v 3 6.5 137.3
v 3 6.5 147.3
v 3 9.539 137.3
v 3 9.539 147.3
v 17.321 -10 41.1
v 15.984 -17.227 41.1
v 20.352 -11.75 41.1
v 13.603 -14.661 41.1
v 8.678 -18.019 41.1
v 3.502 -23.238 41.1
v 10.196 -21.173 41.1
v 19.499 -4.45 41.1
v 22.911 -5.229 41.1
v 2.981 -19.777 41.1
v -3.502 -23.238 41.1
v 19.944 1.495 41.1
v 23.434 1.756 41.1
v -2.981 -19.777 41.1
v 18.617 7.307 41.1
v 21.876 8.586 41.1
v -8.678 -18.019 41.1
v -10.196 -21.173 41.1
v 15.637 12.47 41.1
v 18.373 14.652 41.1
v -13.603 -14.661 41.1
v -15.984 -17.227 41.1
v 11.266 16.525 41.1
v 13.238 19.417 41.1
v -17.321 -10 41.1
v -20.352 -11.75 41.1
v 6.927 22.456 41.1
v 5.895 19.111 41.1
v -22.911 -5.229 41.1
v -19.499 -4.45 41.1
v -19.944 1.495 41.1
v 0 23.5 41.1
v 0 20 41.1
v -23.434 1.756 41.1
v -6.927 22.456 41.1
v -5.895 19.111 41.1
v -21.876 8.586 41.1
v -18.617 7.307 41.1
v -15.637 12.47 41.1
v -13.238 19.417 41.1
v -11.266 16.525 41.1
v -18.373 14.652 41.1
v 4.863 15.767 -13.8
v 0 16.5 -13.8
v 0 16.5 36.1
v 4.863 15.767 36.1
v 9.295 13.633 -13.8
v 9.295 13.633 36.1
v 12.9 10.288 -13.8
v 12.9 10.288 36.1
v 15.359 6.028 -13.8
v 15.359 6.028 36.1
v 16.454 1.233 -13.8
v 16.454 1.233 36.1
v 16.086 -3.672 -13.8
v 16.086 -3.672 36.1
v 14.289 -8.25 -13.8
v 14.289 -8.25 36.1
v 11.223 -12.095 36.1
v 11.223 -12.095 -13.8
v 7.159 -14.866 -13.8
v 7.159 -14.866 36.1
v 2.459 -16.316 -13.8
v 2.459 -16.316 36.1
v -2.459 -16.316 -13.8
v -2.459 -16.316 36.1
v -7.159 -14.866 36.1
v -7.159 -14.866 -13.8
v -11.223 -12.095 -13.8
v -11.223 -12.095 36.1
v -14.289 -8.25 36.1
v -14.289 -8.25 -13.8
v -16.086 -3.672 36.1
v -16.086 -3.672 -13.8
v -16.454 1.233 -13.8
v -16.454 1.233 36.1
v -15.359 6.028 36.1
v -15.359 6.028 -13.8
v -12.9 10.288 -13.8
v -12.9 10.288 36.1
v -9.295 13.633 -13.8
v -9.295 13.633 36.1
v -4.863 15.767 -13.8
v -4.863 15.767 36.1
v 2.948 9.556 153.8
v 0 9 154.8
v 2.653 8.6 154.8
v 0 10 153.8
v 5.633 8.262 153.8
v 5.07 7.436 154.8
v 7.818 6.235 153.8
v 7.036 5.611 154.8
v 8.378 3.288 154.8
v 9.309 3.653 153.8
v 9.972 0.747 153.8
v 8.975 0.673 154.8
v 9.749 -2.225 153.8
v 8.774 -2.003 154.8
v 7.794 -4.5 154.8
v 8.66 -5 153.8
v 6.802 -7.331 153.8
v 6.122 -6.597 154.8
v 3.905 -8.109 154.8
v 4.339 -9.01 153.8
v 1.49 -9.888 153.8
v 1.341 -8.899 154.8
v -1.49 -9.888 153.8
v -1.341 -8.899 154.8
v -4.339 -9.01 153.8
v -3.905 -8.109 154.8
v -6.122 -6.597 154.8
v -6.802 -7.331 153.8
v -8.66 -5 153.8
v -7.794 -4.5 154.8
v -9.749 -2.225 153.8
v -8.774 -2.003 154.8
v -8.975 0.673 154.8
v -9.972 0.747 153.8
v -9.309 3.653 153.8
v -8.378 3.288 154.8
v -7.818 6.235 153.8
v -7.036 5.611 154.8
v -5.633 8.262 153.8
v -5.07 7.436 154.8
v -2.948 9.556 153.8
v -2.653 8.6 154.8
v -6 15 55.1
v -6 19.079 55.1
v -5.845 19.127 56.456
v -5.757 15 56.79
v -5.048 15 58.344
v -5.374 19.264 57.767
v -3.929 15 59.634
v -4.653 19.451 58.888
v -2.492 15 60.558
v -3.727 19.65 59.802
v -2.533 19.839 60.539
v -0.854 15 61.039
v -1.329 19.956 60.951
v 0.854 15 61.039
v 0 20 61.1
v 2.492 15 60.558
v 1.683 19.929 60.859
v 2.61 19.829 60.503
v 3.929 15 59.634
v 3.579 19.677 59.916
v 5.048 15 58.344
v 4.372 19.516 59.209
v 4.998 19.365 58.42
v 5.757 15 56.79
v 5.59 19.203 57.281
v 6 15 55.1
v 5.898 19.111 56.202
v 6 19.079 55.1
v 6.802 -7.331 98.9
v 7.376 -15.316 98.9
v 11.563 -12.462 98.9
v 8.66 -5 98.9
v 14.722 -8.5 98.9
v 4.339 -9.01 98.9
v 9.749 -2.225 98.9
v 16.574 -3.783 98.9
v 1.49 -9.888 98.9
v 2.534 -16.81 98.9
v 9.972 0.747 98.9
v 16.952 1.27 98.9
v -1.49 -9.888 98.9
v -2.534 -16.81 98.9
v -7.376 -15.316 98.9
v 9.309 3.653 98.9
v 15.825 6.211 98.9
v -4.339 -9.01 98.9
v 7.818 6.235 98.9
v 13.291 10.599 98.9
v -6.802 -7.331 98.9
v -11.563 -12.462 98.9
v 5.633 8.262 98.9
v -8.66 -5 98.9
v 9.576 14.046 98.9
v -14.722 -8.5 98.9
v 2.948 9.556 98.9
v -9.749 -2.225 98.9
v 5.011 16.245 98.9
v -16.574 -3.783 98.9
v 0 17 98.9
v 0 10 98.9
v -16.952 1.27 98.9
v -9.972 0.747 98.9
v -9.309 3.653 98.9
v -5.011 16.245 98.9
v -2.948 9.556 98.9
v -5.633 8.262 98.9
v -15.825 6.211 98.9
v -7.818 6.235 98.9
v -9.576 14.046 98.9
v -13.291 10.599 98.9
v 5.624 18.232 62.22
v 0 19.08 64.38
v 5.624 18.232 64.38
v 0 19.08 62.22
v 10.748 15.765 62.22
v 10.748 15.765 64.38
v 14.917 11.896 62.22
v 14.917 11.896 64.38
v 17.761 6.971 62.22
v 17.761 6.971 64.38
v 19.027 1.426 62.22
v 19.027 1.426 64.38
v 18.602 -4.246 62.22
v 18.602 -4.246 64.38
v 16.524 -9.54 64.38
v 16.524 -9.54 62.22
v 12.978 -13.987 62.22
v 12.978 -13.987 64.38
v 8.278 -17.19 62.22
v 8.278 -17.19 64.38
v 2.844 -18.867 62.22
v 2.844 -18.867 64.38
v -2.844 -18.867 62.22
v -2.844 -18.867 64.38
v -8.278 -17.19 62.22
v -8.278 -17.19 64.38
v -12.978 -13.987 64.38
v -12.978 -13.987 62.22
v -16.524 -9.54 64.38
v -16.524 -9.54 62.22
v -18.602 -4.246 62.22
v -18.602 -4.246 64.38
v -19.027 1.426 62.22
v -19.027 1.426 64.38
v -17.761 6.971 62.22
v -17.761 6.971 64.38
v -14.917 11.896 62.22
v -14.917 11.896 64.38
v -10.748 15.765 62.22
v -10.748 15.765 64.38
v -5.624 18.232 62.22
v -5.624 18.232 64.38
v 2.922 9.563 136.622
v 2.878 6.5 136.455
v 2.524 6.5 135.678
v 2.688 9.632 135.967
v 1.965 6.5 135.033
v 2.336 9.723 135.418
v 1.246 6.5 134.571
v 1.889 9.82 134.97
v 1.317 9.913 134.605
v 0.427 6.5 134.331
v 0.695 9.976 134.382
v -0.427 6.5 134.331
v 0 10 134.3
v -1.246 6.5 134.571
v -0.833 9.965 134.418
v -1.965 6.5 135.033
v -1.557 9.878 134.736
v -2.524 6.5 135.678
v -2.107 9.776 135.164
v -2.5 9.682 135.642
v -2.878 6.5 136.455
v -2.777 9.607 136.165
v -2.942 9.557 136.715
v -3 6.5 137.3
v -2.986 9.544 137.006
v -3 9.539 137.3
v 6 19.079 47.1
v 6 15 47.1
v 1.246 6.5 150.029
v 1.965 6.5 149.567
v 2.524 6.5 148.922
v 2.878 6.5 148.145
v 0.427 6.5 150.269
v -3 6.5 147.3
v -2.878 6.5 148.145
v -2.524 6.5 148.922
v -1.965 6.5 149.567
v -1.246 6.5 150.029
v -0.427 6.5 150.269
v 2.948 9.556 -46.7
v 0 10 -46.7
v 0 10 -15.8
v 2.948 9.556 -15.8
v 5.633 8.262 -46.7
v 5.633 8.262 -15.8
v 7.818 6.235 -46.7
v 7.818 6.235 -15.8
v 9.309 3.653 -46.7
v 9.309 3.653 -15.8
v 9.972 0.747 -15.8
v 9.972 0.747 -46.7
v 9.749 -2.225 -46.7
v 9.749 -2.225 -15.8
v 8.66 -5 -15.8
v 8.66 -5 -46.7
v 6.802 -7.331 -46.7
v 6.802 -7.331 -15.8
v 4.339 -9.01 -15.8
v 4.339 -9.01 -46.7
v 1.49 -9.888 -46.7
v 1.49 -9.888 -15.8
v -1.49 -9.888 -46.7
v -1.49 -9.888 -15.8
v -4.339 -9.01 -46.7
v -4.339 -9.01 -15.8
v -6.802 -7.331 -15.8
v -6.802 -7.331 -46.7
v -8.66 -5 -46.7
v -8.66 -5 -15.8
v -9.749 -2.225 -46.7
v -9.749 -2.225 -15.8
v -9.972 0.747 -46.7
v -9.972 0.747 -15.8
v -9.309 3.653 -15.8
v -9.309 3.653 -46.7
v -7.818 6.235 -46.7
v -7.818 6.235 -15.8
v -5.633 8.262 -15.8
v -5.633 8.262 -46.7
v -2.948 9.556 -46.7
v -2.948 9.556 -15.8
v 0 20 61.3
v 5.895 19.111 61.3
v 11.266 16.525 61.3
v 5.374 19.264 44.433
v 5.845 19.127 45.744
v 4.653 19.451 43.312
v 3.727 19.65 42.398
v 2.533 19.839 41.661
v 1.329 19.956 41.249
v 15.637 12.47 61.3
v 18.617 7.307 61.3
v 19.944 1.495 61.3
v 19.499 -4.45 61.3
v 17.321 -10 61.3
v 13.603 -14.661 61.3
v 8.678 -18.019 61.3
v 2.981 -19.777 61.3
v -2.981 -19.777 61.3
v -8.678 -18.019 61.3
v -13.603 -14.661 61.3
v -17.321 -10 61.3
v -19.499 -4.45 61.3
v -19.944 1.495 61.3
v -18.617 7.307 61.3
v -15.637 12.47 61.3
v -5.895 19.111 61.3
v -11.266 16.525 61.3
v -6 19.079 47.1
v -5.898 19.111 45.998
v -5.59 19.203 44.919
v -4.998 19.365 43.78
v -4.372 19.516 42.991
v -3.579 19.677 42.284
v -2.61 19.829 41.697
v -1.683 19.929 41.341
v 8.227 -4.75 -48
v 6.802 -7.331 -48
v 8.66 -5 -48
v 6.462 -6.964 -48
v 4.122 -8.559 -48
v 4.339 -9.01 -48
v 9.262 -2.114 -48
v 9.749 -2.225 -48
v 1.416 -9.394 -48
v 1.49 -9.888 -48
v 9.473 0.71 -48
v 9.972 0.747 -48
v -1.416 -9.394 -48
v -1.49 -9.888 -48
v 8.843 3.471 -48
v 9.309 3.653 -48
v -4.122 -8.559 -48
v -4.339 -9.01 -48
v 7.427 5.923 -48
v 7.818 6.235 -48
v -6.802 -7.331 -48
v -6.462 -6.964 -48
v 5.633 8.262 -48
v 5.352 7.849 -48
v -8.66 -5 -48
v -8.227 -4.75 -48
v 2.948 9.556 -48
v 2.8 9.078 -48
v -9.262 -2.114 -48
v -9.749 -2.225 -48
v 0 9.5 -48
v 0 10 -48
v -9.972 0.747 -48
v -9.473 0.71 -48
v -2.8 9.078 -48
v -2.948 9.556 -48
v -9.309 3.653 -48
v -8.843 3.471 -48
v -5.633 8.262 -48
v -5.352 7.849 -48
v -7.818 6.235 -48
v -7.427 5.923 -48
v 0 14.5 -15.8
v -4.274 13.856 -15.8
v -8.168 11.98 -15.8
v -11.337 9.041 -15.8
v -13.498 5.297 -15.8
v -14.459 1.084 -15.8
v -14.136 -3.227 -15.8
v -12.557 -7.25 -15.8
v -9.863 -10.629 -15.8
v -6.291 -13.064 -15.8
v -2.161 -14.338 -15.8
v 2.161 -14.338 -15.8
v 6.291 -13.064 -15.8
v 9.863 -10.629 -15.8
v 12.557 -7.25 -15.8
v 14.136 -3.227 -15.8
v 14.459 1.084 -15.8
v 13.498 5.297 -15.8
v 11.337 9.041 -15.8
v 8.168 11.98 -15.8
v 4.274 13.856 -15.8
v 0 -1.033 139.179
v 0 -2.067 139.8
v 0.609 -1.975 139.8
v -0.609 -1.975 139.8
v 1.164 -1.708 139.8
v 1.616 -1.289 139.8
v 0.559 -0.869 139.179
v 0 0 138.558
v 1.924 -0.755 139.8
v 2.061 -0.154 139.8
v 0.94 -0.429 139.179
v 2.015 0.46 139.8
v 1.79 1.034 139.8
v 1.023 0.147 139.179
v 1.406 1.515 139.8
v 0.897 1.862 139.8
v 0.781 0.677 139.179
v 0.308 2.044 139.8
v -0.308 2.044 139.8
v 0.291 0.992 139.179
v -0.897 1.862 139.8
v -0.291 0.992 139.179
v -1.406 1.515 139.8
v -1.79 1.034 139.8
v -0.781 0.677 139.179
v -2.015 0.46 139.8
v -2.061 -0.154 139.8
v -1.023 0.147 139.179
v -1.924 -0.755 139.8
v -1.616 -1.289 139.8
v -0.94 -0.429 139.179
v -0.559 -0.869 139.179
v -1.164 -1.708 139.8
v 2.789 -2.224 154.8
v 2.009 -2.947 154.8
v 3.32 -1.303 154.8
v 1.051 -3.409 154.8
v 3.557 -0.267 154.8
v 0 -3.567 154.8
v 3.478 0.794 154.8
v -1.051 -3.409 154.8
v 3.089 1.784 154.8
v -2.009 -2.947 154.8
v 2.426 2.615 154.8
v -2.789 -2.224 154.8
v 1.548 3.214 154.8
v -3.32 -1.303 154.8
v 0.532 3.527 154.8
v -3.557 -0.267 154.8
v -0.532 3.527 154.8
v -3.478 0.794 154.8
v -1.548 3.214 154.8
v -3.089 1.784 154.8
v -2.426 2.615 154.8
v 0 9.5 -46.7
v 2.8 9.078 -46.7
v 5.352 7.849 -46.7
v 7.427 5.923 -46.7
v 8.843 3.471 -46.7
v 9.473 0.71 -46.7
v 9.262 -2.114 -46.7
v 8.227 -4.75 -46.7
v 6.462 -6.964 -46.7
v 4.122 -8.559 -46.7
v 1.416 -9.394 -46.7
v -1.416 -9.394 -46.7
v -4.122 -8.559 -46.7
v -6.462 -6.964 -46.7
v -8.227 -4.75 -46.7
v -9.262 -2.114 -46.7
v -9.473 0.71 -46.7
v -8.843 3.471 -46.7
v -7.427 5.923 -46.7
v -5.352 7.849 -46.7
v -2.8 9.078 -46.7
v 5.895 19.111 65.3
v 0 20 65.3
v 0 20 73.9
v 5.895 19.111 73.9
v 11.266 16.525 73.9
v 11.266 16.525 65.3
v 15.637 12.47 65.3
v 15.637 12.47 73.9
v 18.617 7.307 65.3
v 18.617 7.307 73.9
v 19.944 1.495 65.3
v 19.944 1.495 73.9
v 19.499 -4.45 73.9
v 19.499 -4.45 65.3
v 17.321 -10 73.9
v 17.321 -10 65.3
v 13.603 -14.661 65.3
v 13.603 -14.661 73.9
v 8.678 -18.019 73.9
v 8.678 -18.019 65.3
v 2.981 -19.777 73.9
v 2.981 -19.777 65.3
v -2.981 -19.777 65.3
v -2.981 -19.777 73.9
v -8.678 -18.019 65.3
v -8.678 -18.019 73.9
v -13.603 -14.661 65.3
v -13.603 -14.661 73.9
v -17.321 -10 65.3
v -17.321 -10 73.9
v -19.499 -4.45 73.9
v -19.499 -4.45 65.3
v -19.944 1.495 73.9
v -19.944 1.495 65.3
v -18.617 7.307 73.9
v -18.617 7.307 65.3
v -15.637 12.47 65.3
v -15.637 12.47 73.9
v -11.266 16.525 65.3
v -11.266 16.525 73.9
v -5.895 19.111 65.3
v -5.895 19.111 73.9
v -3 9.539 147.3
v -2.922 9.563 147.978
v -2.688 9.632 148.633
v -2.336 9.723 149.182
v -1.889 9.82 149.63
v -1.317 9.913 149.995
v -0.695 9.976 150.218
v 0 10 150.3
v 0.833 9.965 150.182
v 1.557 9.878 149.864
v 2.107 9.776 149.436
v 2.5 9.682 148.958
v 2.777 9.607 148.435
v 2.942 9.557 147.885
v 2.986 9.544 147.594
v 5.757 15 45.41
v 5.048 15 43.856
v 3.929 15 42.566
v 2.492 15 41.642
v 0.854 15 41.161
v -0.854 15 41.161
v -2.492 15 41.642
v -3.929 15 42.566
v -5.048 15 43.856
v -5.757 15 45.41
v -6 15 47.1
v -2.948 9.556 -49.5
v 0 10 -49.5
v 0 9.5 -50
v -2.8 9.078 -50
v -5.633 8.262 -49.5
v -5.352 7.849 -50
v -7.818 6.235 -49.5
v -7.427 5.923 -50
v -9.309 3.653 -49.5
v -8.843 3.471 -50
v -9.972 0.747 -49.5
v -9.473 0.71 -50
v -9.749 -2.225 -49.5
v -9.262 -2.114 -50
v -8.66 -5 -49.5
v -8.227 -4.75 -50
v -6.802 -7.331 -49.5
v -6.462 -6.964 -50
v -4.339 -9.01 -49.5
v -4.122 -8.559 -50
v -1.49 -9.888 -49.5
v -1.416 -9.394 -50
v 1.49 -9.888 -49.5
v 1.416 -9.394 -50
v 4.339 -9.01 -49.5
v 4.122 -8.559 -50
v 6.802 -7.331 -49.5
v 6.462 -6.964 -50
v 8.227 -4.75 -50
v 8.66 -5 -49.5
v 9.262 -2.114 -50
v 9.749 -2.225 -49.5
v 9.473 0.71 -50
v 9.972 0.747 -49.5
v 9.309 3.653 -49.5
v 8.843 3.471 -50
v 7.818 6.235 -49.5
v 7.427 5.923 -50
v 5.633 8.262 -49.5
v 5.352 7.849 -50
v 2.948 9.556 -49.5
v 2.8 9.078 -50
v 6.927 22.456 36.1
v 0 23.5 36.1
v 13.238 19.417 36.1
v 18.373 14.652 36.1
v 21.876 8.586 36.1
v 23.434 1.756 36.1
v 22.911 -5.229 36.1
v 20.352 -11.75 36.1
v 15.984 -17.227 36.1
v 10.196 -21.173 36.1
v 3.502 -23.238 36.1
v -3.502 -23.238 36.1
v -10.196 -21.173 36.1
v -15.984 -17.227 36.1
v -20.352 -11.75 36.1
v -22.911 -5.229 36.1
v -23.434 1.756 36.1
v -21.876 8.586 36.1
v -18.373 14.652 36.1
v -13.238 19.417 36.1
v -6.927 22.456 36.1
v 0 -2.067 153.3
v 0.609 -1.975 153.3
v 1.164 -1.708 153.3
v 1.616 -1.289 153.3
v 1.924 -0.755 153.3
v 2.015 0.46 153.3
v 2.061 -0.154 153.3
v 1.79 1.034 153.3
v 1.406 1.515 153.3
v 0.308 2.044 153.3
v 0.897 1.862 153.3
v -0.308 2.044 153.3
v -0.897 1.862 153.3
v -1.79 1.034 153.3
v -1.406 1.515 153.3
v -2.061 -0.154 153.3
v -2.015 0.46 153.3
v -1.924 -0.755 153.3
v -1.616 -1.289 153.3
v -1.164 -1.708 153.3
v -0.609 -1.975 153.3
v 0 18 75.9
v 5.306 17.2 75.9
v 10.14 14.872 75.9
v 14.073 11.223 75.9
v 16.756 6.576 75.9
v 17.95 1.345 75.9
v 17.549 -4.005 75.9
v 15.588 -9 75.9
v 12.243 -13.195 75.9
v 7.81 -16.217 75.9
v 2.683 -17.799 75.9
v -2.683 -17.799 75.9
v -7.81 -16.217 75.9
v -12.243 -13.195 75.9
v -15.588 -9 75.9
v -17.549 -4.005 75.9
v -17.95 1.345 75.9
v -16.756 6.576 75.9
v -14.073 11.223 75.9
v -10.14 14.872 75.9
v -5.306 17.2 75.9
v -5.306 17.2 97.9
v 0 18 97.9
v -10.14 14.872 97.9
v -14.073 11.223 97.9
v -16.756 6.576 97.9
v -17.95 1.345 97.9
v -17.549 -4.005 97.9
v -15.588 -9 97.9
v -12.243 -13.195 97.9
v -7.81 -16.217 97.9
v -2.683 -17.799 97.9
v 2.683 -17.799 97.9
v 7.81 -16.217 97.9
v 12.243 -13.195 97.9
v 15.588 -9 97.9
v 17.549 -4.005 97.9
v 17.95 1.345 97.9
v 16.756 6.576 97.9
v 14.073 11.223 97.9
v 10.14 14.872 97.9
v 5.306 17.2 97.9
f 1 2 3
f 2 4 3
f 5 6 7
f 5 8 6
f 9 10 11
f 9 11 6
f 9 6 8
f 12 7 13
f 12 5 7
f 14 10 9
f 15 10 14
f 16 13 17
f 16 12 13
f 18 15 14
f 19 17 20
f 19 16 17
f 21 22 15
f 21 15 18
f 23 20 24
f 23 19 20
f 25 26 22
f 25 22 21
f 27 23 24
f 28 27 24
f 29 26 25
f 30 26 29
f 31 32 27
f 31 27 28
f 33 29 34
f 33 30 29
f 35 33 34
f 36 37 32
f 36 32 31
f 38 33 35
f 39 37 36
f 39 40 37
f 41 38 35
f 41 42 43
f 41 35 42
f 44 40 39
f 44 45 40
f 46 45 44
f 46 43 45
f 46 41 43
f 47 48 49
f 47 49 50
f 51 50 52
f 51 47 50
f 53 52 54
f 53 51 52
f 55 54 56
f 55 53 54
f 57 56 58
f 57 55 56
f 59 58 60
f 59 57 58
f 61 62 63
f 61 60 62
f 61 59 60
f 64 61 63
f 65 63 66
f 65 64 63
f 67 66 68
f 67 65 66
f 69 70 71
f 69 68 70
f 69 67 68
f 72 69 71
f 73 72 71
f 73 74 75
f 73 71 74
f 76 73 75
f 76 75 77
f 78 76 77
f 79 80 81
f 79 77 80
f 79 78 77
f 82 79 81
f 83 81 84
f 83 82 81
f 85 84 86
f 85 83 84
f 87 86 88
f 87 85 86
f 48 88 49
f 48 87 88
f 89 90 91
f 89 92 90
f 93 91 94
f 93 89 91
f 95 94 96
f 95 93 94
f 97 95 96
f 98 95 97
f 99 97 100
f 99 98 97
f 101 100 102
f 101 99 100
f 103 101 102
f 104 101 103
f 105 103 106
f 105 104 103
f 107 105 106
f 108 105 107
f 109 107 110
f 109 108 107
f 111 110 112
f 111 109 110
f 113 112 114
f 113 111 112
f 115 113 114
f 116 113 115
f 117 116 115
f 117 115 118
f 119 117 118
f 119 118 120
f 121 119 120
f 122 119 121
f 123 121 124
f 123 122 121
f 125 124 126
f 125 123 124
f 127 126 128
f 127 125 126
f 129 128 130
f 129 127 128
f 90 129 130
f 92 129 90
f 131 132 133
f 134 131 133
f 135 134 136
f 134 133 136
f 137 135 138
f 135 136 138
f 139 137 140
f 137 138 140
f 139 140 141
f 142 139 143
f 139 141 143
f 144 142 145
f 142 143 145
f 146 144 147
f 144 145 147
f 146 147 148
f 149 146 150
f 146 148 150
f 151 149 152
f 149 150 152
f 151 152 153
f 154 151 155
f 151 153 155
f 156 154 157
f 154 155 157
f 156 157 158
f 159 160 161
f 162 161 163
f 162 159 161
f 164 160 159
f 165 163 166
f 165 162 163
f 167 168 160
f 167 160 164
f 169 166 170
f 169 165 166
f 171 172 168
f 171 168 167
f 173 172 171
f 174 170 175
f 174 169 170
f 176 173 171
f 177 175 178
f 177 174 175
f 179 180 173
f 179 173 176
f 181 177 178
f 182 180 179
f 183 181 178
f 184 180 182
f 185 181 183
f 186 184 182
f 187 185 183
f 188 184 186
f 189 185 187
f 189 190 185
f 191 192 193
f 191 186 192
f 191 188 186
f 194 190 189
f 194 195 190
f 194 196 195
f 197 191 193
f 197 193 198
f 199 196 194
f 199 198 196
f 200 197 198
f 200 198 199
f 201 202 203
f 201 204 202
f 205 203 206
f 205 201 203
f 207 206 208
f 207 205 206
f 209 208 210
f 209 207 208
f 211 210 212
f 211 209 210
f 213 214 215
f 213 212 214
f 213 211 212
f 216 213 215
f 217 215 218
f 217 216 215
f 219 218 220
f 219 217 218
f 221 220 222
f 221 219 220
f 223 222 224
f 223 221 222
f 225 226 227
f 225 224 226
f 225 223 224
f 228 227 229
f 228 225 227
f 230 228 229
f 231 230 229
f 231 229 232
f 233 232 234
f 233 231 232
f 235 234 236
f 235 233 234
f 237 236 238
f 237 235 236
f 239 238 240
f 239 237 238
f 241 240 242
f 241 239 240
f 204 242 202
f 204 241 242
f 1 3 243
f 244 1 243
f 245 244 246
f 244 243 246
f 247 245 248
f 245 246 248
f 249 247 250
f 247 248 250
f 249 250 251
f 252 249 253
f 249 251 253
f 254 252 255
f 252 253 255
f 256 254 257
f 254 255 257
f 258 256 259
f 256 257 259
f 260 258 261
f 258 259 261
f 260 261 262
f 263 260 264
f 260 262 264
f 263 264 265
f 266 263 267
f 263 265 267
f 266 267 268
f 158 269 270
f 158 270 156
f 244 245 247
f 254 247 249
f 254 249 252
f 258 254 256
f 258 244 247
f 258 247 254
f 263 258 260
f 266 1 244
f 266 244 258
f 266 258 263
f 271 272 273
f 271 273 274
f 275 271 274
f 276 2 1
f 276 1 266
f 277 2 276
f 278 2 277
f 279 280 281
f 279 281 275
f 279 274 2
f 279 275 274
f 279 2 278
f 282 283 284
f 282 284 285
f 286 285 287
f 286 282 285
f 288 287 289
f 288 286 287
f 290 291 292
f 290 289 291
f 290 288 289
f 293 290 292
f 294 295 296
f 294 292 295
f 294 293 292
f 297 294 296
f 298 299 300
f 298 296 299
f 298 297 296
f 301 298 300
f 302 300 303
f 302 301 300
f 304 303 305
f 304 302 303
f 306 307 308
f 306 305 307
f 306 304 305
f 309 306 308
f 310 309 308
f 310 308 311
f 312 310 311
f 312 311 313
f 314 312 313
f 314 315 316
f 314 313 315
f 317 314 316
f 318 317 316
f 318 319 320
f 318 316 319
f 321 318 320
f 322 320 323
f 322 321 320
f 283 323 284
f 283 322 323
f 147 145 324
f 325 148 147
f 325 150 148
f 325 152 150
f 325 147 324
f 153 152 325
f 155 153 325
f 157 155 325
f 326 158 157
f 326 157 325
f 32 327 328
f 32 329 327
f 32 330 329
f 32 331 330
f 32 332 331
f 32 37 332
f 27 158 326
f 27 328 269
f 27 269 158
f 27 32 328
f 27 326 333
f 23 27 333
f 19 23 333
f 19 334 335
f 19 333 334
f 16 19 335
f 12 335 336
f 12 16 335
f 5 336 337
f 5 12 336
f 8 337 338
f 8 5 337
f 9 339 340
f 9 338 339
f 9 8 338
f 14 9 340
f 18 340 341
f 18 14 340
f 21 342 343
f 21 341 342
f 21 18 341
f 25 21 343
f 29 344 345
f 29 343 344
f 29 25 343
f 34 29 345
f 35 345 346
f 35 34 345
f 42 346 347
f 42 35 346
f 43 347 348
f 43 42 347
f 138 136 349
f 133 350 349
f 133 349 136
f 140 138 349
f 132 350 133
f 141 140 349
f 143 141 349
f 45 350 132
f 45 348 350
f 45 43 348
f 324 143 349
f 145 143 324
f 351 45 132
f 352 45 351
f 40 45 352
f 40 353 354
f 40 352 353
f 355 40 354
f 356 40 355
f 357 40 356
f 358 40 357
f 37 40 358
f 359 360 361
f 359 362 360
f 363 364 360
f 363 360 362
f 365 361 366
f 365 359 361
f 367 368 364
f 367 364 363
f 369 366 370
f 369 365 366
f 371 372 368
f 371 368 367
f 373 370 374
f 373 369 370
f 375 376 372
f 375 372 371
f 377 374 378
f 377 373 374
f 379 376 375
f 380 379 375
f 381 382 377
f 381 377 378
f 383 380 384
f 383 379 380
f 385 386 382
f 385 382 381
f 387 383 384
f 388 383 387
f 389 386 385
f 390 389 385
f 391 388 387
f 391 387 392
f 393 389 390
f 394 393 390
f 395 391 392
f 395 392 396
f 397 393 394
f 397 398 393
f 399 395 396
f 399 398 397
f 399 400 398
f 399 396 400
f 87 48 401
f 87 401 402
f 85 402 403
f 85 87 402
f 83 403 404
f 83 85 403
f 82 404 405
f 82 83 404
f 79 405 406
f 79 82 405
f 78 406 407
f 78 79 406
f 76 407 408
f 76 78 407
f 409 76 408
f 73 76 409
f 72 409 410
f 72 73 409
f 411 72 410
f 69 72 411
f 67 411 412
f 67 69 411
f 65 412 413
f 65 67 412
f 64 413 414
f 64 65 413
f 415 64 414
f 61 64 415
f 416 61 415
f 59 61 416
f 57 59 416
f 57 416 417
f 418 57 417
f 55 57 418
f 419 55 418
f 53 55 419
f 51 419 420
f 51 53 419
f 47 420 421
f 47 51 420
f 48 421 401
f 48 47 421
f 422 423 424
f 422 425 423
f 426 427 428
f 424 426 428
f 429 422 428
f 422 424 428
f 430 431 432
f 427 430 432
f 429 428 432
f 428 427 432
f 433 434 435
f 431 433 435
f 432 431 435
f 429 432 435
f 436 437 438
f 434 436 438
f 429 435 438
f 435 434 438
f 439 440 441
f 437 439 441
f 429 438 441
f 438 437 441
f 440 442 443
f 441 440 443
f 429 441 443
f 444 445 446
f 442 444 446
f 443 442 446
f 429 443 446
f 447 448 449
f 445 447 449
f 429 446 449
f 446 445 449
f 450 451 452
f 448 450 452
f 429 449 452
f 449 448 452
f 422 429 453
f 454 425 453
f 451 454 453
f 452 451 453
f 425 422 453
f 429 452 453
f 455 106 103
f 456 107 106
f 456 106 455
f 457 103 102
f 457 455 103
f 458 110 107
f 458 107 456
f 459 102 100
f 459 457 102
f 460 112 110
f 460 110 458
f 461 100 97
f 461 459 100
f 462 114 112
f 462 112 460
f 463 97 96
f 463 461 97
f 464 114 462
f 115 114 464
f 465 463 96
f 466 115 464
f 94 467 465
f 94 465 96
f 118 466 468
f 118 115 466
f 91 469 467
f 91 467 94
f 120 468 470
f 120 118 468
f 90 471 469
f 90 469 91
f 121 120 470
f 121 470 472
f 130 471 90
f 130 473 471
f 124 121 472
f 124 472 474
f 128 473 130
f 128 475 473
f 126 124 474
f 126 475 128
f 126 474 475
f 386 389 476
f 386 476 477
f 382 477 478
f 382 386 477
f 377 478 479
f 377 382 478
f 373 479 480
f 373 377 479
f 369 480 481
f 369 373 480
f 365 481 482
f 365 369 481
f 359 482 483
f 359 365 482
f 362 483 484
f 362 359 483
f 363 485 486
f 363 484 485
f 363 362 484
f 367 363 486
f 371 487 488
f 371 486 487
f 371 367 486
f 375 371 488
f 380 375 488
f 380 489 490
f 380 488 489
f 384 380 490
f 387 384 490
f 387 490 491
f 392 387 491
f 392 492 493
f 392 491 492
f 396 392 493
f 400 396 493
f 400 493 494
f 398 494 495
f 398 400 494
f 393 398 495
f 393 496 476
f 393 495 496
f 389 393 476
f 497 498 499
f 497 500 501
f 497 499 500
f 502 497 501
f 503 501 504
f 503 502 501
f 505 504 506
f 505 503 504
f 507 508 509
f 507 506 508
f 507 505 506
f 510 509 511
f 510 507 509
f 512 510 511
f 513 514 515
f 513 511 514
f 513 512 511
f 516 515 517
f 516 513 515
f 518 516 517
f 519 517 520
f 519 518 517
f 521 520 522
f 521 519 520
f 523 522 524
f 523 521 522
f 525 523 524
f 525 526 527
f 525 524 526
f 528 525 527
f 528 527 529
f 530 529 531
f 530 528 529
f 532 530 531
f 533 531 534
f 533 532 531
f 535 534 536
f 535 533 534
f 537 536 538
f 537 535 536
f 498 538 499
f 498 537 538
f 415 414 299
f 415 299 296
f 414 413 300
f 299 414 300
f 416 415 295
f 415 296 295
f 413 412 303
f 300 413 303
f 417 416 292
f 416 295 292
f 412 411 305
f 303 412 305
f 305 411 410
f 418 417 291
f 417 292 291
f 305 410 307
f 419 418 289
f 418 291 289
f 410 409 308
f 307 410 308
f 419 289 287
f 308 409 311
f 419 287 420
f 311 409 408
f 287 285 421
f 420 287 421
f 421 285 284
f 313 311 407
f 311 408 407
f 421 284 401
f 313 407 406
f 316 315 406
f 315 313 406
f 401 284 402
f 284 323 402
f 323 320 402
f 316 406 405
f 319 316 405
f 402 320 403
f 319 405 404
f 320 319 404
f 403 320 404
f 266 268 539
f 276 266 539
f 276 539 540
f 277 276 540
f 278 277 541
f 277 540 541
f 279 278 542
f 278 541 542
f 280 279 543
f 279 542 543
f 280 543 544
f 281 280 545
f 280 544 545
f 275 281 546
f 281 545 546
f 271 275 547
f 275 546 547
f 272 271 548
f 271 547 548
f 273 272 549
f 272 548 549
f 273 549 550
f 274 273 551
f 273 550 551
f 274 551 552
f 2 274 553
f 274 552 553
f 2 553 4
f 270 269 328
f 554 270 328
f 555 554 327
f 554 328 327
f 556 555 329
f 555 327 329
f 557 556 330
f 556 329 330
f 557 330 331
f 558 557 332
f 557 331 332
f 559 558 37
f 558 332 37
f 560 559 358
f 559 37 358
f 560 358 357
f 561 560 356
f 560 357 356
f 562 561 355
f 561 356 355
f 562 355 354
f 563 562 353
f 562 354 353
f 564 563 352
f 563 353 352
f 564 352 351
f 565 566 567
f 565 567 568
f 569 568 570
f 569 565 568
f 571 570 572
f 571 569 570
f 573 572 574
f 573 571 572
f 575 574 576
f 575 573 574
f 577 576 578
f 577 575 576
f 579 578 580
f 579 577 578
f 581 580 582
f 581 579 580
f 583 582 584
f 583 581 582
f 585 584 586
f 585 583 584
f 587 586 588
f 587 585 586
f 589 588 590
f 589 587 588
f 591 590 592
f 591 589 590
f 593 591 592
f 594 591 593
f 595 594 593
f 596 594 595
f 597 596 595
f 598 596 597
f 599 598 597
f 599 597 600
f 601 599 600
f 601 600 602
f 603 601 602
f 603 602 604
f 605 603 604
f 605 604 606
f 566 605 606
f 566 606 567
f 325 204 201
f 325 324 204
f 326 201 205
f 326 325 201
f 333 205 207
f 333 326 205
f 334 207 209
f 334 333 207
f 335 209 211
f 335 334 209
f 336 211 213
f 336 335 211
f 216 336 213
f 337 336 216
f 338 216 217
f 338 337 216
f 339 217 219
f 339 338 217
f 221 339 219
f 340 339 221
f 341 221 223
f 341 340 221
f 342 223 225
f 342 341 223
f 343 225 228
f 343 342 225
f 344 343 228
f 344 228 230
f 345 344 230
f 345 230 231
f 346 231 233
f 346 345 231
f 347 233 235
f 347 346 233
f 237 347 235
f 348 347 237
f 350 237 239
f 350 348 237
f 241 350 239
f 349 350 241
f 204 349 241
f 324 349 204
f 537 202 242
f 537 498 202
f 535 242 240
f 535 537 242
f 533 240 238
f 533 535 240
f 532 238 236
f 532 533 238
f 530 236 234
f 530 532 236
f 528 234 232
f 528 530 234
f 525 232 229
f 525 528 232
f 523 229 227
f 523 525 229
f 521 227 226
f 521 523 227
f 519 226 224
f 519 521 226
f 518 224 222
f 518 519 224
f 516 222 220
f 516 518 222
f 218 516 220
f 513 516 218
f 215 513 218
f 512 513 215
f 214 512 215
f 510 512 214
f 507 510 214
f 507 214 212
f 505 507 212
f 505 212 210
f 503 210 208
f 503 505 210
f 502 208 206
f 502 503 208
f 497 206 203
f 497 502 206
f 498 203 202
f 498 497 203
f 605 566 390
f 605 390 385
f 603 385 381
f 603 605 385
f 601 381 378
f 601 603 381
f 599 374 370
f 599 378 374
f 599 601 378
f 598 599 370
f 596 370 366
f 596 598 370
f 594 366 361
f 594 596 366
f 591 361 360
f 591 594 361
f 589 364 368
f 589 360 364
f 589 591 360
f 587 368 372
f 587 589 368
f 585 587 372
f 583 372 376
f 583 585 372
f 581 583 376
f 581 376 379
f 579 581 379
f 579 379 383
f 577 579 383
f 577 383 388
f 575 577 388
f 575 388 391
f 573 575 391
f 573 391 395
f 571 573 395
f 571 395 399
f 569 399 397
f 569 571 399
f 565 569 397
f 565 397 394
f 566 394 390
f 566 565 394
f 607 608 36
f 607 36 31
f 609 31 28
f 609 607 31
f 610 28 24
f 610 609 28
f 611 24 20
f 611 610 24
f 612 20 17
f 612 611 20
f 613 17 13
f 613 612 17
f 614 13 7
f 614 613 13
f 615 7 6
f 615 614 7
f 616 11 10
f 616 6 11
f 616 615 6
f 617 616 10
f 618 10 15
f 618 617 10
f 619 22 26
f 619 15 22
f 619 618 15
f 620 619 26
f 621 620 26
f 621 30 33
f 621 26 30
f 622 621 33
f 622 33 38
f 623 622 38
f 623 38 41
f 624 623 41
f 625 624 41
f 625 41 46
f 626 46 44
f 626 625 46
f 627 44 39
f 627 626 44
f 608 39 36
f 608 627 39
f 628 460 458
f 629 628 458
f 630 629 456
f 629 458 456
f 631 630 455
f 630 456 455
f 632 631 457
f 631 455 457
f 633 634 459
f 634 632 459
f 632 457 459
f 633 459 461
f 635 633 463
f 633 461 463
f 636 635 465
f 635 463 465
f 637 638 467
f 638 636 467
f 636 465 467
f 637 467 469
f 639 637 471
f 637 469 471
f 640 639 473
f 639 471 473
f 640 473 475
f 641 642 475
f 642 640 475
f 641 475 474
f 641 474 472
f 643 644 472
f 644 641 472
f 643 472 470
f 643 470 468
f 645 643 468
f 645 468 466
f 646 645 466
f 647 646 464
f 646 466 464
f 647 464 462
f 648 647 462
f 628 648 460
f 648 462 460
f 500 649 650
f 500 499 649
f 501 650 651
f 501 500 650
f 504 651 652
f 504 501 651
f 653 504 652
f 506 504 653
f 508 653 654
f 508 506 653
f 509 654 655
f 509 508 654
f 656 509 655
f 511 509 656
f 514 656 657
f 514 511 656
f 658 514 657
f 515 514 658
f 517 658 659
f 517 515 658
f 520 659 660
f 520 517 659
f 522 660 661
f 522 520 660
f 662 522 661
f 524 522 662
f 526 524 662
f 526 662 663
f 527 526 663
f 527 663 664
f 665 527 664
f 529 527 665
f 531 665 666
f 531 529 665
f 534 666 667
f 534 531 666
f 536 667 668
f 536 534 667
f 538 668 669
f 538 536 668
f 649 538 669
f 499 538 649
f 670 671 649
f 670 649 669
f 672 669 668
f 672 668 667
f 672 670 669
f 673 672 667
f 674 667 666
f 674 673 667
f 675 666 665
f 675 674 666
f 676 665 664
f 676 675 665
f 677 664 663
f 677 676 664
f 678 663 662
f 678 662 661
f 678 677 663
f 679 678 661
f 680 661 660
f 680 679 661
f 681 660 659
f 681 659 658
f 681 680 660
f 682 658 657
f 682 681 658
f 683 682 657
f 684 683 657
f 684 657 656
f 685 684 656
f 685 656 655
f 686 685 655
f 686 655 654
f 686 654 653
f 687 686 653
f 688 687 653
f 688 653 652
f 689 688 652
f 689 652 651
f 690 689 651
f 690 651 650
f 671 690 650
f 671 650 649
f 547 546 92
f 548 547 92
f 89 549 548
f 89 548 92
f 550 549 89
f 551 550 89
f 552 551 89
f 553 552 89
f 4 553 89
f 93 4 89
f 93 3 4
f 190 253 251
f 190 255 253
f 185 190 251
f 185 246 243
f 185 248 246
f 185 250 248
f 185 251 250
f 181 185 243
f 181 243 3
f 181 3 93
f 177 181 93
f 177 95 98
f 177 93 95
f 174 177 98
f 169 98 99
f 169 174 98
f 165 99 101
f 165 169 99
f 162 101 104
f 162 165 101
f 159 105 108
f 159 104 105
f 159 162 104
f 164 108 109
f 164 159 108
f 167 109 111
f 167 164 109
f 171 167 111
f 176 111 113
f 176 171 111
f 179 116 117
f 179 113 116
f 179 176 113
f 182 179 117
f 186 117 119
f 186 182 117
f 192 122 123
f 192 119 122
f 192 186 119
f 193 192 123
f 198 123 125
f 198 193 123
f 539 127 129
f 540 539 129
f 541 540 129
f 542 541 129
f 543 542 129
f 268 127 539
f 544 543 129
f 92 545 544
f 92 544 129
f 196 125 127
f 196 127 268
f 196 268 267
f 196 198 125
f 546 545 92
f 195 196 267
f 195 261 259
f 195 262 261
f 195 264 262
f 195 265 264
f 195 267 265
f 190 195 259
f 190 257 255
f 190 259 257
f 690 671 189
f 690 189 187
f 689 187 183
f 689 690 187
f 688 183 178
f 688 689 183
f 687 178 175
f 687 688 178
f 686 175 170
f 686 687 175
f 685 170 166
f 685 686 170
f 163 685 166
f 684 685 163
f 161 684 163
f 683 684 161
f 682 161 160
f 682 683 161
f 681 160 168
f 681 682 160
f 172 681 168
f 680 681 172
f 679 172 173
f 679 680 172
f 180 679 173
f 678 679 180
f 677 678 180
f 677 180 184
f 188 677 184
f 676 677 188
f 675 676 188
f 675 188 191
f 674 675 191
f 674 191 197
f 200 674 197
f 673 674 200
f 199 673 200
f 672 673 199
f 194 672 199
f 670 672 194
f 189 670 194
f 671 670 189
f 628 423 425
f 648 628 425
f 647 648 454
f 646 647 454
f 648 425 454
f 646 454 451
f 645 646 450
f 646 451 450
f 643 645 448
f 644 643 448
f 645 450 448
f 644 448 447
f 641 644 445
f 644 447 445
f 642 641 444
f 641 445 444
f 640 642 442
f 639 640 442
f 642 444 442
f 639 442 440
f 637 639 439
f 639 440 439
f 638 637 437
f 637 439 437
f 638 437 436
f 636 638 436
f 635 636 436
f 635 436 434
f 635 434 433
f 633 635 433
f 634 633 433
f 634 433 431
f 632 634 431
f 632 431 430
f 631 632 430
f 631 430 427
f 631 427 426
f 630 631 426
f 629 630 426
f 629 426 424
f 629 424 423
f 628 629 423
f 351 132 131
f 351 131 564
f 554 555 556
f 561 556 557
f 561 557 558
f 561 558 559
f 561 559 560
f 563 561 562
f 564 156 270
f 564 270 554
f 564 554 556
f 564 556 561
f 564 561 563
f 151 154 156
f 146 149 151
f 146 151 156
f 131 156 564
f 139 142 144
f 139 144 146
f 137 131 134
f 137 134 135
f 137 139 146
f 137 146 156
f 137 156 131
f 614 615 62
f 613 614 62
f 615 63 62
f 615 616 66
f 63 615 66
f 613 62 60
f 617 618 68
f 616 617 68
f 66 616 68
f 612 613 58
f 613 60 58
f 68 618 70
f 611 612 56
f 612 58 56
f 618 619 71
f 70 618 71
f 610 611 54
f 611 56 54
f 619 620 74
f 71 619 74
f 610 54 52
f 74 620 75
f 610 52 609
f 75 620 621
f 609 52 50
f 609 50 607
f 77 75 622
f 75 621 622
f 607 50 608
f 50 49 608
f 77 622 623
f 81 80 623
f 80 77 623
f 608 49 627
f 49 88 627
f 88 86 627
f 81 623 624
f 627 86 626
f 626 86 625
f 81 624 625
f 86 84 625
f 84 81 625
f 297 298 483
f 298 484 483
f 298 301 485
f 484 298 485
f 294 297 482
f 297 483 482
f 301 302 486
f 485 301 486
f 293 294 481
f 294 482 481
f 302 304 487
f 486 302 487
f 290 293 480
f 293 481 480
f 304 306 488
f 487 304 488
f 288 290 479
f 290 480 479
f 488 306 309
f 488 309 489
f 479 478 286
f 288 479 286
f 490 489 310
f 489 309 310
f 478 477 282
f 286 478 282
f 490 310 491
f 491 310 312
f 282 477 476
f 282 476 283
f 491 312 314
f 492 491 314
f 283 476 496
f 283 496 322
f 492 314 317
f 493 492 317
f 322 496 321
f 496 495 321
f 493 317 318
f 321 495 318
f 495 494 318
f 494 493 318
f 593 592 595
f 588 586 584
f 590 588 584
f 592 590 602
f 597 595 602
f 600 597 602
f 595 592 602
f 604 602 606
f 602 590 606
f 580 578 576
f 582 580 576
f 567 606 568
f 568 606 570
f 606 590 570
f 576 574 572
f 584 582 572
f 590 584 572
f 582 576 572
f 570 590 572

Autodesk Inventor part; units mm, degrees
ref_plane "YZ Plane" through (0, 0, 0) normal (1, 0, 0) x (0, 1, 0)
ref_plane "XY Plane" through (0, 0, 0) normal (0, 0, 1) x (1, 0, 0)
sketch "Skizze1" plane through (0, 0, 0) normal (1, 0, 0) x (0, 1, 0)
  line L0 (0, 154.8) -> (9, 154.8)
  line L1 (9, 154.8) -> (10, 153.8)
  line L2 (10, 153.8) -> (10, 98.9)
  line L3 (18, 75.9) -> (20, 73.9)
  line L4 (20, 73.9) -> (20, 65.3)
  line L5 (20, 61.3) -> (20, 41.1)
  line L6 (20, 41.1) -> (23.5, 41.1)
  line L7 (23.5, 41.1) -> (23.5, 36.1)
  line L8 (23.5, 36.1) -> (16.5, 36.1)
  line L9 (16.5, 36.1) -> (16.5, -13.8)
  line L10 (10, -15.8) -> (10, -46.7)
  line L11 (10, -46.7) -> (9.5, -46.7)
  line L12 (9.5, -46.7) -> (9.5, -48)
  line L13 (9.5, -48) -> (10, -48)
  line L14 (10, -48) -> (10, -49.5)
  line L15 (10, -49.5) -> (9.5, -50)
  line L16 (9.5, -50) -> (0, -50)
  line L17 (0, -50) -> (0, 154.8)
  line L18 (14.5, -15.8) -> (10, -15.8)
  line L19 (16.5, -13.8) -> (14.5, -15.8)
  line L20 (0, 195.76) -> (0, -90.96) construction
  line L21 (-4.7, 0) -> (28.2, 0) construction
  line L22 (10, 98.9) -> (0, 98.9) construction
  line L23 (10, -15.8) -> (0, -15.8) construction
  line L24 (10, -46.7) -> (0, -46.7) construction
  line L25 (17, 98.9) -> (10, 98.9)
  line L26 (18, 75.9) -> (18, 97.9)
  line L27 (18, 97.9) -> (17, 98.9)
  line L28 (10, 129.8) -> (0, 129.8) construction
  circle A0 centre (20, 63.3) radius 2 construction
  line L29 (20, 65.3) -> (19.0799, 64.3799)
  line L30 (19.0799, 64.3799) -> (19.0799, 62.2201)
  line L31 (19.0799, 62.2201) -> (20, 61.3)
  line L32 (20, 63.3) -> (19.0799, 63.3) construction
  point P0 (0, 0)
  point P1 (18, 98.9)
  dimension "d4" = 45
  dimension "d6" = 1.3
  dimension "d9" = 23.5
  dimension "d11" = 5
  dimension "d19" = 45
  dimension "d20" = 2
  dimension "d21" = 2
  dimension "d22" = 1
  dimension "d34" = 0
  dimension "d35" = 50
  dimension "d36" = 45
  dimension "d87" = 114.7
  dimension "d88" = 0
  dimension "d89" = 30.9
  dimension "d90" = 19
  dimension "d91" = 20
  dimension "d119" = 20
  dimension "d120" = 1.5
  dimension "d122" = 1
  dimension "d123" = 1
  dimension "d124" = 33
  dimension "d125" = 40
  dimension "d126" = 30.9
  dimension "d127" = 25
  dimension "d135" = 78.9
  dimension "d139" = 91.5
  dimension "d140" = 113.7
  dimension "d141" = 22.2
  dimension "d142" = 45
  dimension "d143" = 45
  dimension "d144" = 38.1598
  dimension "d145" = 8.6
revolve "Umdrehung1" add sketch "Skizze1" angle 360 about axis through (0, 0, -50) along (0, 0, 1)
ref_plane "Wellennuttiefe_Arbeitsebene" through (0, 15, 51.2) normal (0, 1, 0) x (-1, 0, 0)
ref_plane "Arbeitsebene1" through (0, 20, 51.2) normal (0, 1, 0) x (-1, 0, 0)
sketch "Skizze2" plane through (0, 20, 51.2) normal (0, 1, 0) x (-1, 0, 0)
  line L0 (0, 9.9) -> (0, -10.1) construction
  line L1 (6, 3.9) -> (6, -4.1)
  line L2 (-6, -4.1) -> (-6, 3.9)
  arc A0 (6, 3.9) -> (-6, 3.9) centre (0, 3.9) ccw
  arc A1 (-6, -4.1) -> (6, -4.1) centre (0, -4.1) ccw
  line L3 (-23.5, -10.1) -> (23.5, -10.1) construction
  line L4 (0, 144.56) -> (0, -142.16) construction
  point P0 (0, -51.2)
  point P1 (0, -0.1)
  dimension "d29" = 20
  dimension "d30" = 12
extrude "Passfeder_Ausnahme" cut sketch "Skizze2" against normal up to surface (5 mm away)
thread "Gewinde1" size "M40x1.5" class "6g" standard "ISO Metric profile" full length
ref_plane "Arbeitsebene5" through (0, 10, 126.35) normal (0, 1, 0) x (-1, 0, 0)
sketch "Skizze7" plane through (0, 10, 126.35) normal (0, 1, 0) x (-1, 0, 0)
  line L0 (-10, -27.45) -> (10, -27.45) construction
  line L1 (10, 3.45) -> (-10, 3.45) construction
  line L2 (-10, -27.45) -> (10, -27.45) construction
  line L3 (0, -27.45) -> (0, 3.45) construction
  line L4 (10, 27.45) -> (10, -27.45) construction
  line L5 (-10, 27.45) -> (-10, -27.45) construction
  line L6 (0, 10.95) -> (0, 20.95) construction
  line L7 (3, 10.95) -> (3, 20.95)
  line L8 (-3, 20.95) -> (-3, 10.95)
  arc A0 (-3, 10.95) -> (3, 10.95) centre (0, 10.95) ccw
  arc A1 (3, 20.95) -> (-3, 20.95) centre (0, 20.95) ccw
  line L9 (0, 7.95) -> (3, 7.95) construction
  line L10 (-9, 28.45) -> (9, 28.45) construction
  line L11 (-17, -27.45) -> (17, -27.45) construction
  line L12 (0, 28.45) -> (0, 3.45) construction
  point P0 (0, -126.35)
  point P1 (0, 15.95)
  point P2 (0, 23.95)
  dimension "d100" = 30.9
  dimension "d101" = 6
  dimension "d102" = 16
  dimension "Flansch_Max_Connector_Lenght" = 25
ref_plane "Wellennuttiefe_Arbeitsebene_2" through (0, 6.5, 126.35) normal (0, 1, 0) x (-1, 0, 0)
extrude "PassfederNut_HeadSide" cut sketch "Skizze7" against normal up to surface (3.5 mm away)
sketch "Skizze9" plane through (0, 0, 154.8) normal (0, 0, 1) x (1, 0, 0)
  circle A0 centre (0, 0) radius 9 construction
  point P0 (0, 0)
hole "Bohrung1" at (0, 0, 154.8) direction (0, 0, -1) diameter 4.134 depth 15 tip angle 118 thread size "M5x0.8" class "6H" standard "ISO Metric profile"
chamfer "Fase4" distance 1.5 angle 45 1 edges at (0, 2.067, 154.8)
equation "\"d6\" = Sprengring_NutBreite"
equation "\"d87\" = -MainAxis_Bearing_Fix2ScrewLimit_Dist + Gestell_Lager_Distanz - MainAxis_Bearing_Fix2Limit_Dist"
equation "\"d89\" = MainAxis_Bearing_Fix2Limit_Dist + MainAxis_Bearing_Fix2ScrewLimit_Dist"
equation "\"d90\" = Sprengring_NutDurchmesser"
equation "\"d91\" = P204_ShaftDiameter"
equation "\"d119\" = P204_ShaftDiameter"
equation "\"d29\" = Passfeder_length"
equation "\"d100\" = MainAxis_Bearing_Fix2ScrewLimit_Dist + MainAxis_Bearing_Fix2Limit_Dist"
equation "\"Wellennuttiefe_20\" = 3.5"
equation "\"Nabennuttiefe_20\" = 2.8"
equation "\"Sprengring_NutBreite\" = 1.3"
equation "\"Sprengring_NutDurchmesser\" = 19"
equation "\"Nabennuttiefe_40\" = 3.3"
equation "\"Wellennuttiefe_40\" = 5"
equation "\"Passfeder_Width_20\" = 6"
equation "\"Passfeder_Width_40\" = 12"
equation "\"MainAxis_Bearing_Fix2ScrewLimit_Dist\" = 23.4"
equation "\"Gestell_Lager_Distanz\" = 145.6"
equation "\"MainAxis_Bearing_Fix2Limit_Dist\" = 7.5"
equation "\"P204_ShaftDiameter\" = 20"
equation "\"Passfeder_length\" = 20"
properties part number "Welle" material "Edelstahl"
